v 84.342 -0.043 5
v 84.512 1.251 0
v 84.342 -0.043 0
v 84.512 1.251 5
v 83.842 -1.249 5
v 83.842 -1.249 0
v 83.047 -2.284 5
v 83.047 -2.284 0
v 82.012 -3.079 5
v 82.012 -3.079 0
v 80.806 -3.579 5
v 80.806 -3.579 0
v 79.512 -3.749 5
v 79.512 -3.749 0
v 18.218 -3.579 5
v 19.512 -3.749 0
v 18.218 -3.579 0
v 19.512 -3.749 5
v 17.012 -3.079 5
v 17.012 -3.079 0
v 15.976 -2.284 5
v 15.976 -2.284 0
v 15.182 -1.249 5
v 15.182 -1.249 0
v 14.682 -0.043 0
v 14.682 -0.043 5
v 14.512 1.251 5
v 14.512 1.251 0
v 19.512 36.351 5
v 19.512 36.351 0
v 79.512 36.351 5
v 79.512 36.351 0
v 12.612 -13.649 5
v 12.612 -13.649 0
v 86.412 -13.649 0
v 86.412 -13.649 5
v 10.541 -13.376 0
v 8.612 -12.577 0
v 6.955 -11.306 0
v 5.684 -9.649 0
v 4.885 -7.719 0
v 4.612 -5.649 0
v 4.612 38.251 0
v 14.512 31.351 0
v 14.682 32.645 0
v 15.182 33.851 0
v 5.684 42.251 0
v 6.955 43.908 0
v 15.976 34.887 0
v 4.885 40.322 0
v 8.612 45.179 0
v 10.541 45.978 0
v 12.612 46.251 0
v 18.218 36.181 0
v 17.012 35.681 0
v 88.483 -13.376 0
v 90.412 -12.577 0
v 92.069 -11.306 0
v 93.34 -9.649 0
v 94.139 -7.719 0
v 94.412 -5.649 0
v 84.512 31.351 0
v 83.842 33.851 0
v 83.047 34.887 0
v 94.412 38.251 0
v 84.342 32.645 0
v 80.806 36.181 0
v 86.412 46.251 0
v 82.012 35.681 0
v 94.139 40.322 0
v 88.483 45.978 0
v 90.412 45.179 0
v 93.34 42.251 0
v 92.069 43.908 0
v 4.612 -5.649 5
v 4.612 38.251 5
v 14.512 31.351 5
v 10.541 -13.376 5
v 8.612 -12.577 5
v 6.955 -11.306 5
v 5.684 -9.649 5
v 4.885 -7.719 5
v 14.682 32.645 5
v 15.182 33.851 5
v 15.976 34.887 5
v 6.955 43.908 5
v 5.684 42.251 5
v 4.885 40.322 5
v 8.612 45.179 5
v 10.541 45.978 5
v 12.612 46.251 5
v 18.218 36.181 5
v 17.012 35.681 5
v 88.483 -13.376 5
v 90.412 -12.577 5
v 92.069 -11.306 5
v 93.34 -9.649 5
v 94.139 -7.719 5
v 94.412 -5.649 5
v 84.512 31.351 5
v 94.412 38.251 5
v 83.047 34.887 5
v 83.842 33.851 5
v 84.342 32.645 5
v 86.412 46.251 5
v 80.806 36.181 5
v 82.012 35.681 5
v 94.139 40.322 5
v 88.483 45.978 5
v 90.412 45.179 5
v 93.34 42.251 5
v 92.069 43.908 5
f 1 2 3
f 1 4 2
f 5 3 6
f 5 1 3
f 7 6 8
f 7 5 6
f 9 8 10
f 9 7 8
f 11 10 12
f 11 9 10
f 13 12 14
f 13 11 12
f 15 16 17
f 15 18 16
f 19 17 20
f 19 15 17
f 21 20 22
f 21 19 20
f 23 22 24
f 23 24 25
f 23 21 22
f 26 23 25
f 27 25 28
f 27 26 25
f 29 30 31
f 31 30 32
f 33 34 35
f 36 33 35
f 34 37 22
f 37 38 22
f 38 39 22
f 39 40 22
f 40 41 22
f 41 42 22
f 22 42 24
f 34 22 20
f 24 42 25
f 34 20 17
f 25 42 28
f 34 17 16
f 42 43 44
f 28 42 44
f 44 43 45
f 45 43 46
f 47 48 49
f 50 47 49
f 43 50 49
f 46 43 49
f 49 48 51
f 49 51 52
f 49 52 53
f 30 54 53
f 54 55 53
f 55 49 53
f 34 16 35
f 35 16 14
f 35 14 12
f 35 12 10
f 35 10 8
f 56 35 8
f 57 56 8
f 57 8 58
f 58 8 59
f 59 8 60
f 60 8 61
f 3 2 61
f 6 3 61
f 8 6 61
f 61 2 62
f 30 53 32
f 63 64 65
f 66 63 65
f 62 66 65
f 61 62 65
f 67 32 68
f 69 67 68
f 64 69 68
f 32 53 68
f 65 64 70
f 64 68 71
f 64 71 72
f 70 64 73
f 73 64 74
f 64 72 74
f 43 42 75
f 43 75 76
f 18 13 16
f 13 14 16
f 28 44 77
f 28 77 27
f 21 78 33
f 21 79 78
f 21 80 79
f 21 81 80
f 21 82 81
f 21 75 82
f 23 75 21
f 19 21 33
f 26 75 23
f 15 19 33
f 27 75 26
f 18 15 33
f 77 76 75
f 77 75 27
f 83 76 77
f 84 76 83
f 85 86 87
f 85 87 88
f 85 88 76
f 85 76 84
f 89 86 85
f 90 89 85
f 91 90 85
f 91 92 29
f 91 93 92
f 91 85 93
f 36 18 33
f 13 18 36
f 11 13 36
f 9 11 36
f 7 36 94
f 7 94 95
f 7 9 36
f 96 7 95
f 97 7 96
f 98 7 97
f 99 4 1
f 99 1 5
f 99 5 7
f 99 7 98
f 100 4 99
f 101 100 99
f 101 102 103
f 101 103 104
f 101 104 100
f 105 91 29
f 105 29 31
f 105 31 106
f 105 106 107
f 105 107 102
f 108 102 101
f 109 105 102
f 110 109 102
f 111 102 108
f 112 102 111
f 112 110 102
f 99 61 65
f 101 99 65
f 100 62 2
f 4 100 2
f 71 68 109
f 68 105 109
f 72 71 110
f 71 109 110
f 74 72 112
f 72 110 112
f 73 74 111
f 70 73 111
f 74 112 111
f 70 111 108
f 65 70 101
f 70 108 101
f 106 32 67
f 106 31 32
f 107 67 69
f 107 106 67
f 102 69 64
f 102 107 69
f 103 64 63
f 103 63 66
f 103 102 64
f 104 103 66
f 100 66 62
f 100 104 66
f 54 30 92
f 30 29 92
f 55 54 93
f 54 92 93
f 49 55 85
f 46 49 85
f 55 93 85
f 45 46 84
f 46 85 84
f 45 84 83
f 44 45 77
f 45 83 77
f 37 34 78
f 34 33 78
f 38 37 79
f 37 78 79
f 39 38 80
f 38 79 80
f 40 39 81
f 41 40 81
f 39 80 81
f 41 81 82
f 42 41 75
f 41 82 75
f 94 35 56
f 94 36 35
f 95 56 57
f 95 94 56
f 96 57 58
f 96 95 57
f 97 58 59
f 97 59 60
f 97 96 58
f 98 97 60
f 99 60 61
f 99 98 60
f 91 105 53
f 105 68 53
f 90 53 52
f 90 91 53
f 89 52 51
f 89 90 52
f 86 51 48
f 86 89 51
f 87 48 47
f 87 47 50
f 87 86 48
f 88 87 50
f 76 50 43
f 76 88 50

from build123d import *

# Parameters (mm, degrees)
BOSS_EXTRUDE1_DEPTH = 5
FILLET1_R           = 8
FILLET3_R           = 5


with BuildPart() as part:
    # Sketch1 → Boss-Extrude1 (new body)
    with BuildSketch(Plane.XY):
        Polygon((49.511947656, -13.648927203), (4.611947656, -13.648927203), (4.611947656, 46.251072797), (49.511947656, 46.251072797), (49.511947656, 36.351072797), (14.511947656, 36.351072797), (14.511947656, -3.748927203), (49.511947656, -3.748927203), align=None)
    boss_extrude1 = extrude(amount=BOSS_EXTRUDE1_DEPTH)

    # Mirror1: Boss-Extrude1 across plane
    add(boss_extrude1.mirror(Plane(origin=(49.511947656, 0, 0), x_dir=(0, 0, 1), z_dir=(1, 0, 0))))

    # Fillet1
    fillet1_edges = [part.edges().sort_by_distance(p)[0] for p in [
        (4.611947656, -13.648927203, 2.5),
        (4.611947656, 46.251072797, 2.5),
        (94.411947656, -13.648927203, 2.5),
        (94.411947656, 46.251072797, 2.5),
    ]]
    fillet(fillet1_edges, radius=FILLET1_R)

    # Fillet3
    fillet3_edges = [part.edges().sort_by_distance(p)[0] for p in [
        (14.511947656, 36.351072797, 2.5),
        (14.511947656, -3.748927203, 2.5),
        (84.511947656, 36.351072797, 2.5),
        (84.511947656, -3.748927203, 2.5),
    ]]
    fillet(fillet3_edges, radius=FILLET3_R)


solid = part.part
